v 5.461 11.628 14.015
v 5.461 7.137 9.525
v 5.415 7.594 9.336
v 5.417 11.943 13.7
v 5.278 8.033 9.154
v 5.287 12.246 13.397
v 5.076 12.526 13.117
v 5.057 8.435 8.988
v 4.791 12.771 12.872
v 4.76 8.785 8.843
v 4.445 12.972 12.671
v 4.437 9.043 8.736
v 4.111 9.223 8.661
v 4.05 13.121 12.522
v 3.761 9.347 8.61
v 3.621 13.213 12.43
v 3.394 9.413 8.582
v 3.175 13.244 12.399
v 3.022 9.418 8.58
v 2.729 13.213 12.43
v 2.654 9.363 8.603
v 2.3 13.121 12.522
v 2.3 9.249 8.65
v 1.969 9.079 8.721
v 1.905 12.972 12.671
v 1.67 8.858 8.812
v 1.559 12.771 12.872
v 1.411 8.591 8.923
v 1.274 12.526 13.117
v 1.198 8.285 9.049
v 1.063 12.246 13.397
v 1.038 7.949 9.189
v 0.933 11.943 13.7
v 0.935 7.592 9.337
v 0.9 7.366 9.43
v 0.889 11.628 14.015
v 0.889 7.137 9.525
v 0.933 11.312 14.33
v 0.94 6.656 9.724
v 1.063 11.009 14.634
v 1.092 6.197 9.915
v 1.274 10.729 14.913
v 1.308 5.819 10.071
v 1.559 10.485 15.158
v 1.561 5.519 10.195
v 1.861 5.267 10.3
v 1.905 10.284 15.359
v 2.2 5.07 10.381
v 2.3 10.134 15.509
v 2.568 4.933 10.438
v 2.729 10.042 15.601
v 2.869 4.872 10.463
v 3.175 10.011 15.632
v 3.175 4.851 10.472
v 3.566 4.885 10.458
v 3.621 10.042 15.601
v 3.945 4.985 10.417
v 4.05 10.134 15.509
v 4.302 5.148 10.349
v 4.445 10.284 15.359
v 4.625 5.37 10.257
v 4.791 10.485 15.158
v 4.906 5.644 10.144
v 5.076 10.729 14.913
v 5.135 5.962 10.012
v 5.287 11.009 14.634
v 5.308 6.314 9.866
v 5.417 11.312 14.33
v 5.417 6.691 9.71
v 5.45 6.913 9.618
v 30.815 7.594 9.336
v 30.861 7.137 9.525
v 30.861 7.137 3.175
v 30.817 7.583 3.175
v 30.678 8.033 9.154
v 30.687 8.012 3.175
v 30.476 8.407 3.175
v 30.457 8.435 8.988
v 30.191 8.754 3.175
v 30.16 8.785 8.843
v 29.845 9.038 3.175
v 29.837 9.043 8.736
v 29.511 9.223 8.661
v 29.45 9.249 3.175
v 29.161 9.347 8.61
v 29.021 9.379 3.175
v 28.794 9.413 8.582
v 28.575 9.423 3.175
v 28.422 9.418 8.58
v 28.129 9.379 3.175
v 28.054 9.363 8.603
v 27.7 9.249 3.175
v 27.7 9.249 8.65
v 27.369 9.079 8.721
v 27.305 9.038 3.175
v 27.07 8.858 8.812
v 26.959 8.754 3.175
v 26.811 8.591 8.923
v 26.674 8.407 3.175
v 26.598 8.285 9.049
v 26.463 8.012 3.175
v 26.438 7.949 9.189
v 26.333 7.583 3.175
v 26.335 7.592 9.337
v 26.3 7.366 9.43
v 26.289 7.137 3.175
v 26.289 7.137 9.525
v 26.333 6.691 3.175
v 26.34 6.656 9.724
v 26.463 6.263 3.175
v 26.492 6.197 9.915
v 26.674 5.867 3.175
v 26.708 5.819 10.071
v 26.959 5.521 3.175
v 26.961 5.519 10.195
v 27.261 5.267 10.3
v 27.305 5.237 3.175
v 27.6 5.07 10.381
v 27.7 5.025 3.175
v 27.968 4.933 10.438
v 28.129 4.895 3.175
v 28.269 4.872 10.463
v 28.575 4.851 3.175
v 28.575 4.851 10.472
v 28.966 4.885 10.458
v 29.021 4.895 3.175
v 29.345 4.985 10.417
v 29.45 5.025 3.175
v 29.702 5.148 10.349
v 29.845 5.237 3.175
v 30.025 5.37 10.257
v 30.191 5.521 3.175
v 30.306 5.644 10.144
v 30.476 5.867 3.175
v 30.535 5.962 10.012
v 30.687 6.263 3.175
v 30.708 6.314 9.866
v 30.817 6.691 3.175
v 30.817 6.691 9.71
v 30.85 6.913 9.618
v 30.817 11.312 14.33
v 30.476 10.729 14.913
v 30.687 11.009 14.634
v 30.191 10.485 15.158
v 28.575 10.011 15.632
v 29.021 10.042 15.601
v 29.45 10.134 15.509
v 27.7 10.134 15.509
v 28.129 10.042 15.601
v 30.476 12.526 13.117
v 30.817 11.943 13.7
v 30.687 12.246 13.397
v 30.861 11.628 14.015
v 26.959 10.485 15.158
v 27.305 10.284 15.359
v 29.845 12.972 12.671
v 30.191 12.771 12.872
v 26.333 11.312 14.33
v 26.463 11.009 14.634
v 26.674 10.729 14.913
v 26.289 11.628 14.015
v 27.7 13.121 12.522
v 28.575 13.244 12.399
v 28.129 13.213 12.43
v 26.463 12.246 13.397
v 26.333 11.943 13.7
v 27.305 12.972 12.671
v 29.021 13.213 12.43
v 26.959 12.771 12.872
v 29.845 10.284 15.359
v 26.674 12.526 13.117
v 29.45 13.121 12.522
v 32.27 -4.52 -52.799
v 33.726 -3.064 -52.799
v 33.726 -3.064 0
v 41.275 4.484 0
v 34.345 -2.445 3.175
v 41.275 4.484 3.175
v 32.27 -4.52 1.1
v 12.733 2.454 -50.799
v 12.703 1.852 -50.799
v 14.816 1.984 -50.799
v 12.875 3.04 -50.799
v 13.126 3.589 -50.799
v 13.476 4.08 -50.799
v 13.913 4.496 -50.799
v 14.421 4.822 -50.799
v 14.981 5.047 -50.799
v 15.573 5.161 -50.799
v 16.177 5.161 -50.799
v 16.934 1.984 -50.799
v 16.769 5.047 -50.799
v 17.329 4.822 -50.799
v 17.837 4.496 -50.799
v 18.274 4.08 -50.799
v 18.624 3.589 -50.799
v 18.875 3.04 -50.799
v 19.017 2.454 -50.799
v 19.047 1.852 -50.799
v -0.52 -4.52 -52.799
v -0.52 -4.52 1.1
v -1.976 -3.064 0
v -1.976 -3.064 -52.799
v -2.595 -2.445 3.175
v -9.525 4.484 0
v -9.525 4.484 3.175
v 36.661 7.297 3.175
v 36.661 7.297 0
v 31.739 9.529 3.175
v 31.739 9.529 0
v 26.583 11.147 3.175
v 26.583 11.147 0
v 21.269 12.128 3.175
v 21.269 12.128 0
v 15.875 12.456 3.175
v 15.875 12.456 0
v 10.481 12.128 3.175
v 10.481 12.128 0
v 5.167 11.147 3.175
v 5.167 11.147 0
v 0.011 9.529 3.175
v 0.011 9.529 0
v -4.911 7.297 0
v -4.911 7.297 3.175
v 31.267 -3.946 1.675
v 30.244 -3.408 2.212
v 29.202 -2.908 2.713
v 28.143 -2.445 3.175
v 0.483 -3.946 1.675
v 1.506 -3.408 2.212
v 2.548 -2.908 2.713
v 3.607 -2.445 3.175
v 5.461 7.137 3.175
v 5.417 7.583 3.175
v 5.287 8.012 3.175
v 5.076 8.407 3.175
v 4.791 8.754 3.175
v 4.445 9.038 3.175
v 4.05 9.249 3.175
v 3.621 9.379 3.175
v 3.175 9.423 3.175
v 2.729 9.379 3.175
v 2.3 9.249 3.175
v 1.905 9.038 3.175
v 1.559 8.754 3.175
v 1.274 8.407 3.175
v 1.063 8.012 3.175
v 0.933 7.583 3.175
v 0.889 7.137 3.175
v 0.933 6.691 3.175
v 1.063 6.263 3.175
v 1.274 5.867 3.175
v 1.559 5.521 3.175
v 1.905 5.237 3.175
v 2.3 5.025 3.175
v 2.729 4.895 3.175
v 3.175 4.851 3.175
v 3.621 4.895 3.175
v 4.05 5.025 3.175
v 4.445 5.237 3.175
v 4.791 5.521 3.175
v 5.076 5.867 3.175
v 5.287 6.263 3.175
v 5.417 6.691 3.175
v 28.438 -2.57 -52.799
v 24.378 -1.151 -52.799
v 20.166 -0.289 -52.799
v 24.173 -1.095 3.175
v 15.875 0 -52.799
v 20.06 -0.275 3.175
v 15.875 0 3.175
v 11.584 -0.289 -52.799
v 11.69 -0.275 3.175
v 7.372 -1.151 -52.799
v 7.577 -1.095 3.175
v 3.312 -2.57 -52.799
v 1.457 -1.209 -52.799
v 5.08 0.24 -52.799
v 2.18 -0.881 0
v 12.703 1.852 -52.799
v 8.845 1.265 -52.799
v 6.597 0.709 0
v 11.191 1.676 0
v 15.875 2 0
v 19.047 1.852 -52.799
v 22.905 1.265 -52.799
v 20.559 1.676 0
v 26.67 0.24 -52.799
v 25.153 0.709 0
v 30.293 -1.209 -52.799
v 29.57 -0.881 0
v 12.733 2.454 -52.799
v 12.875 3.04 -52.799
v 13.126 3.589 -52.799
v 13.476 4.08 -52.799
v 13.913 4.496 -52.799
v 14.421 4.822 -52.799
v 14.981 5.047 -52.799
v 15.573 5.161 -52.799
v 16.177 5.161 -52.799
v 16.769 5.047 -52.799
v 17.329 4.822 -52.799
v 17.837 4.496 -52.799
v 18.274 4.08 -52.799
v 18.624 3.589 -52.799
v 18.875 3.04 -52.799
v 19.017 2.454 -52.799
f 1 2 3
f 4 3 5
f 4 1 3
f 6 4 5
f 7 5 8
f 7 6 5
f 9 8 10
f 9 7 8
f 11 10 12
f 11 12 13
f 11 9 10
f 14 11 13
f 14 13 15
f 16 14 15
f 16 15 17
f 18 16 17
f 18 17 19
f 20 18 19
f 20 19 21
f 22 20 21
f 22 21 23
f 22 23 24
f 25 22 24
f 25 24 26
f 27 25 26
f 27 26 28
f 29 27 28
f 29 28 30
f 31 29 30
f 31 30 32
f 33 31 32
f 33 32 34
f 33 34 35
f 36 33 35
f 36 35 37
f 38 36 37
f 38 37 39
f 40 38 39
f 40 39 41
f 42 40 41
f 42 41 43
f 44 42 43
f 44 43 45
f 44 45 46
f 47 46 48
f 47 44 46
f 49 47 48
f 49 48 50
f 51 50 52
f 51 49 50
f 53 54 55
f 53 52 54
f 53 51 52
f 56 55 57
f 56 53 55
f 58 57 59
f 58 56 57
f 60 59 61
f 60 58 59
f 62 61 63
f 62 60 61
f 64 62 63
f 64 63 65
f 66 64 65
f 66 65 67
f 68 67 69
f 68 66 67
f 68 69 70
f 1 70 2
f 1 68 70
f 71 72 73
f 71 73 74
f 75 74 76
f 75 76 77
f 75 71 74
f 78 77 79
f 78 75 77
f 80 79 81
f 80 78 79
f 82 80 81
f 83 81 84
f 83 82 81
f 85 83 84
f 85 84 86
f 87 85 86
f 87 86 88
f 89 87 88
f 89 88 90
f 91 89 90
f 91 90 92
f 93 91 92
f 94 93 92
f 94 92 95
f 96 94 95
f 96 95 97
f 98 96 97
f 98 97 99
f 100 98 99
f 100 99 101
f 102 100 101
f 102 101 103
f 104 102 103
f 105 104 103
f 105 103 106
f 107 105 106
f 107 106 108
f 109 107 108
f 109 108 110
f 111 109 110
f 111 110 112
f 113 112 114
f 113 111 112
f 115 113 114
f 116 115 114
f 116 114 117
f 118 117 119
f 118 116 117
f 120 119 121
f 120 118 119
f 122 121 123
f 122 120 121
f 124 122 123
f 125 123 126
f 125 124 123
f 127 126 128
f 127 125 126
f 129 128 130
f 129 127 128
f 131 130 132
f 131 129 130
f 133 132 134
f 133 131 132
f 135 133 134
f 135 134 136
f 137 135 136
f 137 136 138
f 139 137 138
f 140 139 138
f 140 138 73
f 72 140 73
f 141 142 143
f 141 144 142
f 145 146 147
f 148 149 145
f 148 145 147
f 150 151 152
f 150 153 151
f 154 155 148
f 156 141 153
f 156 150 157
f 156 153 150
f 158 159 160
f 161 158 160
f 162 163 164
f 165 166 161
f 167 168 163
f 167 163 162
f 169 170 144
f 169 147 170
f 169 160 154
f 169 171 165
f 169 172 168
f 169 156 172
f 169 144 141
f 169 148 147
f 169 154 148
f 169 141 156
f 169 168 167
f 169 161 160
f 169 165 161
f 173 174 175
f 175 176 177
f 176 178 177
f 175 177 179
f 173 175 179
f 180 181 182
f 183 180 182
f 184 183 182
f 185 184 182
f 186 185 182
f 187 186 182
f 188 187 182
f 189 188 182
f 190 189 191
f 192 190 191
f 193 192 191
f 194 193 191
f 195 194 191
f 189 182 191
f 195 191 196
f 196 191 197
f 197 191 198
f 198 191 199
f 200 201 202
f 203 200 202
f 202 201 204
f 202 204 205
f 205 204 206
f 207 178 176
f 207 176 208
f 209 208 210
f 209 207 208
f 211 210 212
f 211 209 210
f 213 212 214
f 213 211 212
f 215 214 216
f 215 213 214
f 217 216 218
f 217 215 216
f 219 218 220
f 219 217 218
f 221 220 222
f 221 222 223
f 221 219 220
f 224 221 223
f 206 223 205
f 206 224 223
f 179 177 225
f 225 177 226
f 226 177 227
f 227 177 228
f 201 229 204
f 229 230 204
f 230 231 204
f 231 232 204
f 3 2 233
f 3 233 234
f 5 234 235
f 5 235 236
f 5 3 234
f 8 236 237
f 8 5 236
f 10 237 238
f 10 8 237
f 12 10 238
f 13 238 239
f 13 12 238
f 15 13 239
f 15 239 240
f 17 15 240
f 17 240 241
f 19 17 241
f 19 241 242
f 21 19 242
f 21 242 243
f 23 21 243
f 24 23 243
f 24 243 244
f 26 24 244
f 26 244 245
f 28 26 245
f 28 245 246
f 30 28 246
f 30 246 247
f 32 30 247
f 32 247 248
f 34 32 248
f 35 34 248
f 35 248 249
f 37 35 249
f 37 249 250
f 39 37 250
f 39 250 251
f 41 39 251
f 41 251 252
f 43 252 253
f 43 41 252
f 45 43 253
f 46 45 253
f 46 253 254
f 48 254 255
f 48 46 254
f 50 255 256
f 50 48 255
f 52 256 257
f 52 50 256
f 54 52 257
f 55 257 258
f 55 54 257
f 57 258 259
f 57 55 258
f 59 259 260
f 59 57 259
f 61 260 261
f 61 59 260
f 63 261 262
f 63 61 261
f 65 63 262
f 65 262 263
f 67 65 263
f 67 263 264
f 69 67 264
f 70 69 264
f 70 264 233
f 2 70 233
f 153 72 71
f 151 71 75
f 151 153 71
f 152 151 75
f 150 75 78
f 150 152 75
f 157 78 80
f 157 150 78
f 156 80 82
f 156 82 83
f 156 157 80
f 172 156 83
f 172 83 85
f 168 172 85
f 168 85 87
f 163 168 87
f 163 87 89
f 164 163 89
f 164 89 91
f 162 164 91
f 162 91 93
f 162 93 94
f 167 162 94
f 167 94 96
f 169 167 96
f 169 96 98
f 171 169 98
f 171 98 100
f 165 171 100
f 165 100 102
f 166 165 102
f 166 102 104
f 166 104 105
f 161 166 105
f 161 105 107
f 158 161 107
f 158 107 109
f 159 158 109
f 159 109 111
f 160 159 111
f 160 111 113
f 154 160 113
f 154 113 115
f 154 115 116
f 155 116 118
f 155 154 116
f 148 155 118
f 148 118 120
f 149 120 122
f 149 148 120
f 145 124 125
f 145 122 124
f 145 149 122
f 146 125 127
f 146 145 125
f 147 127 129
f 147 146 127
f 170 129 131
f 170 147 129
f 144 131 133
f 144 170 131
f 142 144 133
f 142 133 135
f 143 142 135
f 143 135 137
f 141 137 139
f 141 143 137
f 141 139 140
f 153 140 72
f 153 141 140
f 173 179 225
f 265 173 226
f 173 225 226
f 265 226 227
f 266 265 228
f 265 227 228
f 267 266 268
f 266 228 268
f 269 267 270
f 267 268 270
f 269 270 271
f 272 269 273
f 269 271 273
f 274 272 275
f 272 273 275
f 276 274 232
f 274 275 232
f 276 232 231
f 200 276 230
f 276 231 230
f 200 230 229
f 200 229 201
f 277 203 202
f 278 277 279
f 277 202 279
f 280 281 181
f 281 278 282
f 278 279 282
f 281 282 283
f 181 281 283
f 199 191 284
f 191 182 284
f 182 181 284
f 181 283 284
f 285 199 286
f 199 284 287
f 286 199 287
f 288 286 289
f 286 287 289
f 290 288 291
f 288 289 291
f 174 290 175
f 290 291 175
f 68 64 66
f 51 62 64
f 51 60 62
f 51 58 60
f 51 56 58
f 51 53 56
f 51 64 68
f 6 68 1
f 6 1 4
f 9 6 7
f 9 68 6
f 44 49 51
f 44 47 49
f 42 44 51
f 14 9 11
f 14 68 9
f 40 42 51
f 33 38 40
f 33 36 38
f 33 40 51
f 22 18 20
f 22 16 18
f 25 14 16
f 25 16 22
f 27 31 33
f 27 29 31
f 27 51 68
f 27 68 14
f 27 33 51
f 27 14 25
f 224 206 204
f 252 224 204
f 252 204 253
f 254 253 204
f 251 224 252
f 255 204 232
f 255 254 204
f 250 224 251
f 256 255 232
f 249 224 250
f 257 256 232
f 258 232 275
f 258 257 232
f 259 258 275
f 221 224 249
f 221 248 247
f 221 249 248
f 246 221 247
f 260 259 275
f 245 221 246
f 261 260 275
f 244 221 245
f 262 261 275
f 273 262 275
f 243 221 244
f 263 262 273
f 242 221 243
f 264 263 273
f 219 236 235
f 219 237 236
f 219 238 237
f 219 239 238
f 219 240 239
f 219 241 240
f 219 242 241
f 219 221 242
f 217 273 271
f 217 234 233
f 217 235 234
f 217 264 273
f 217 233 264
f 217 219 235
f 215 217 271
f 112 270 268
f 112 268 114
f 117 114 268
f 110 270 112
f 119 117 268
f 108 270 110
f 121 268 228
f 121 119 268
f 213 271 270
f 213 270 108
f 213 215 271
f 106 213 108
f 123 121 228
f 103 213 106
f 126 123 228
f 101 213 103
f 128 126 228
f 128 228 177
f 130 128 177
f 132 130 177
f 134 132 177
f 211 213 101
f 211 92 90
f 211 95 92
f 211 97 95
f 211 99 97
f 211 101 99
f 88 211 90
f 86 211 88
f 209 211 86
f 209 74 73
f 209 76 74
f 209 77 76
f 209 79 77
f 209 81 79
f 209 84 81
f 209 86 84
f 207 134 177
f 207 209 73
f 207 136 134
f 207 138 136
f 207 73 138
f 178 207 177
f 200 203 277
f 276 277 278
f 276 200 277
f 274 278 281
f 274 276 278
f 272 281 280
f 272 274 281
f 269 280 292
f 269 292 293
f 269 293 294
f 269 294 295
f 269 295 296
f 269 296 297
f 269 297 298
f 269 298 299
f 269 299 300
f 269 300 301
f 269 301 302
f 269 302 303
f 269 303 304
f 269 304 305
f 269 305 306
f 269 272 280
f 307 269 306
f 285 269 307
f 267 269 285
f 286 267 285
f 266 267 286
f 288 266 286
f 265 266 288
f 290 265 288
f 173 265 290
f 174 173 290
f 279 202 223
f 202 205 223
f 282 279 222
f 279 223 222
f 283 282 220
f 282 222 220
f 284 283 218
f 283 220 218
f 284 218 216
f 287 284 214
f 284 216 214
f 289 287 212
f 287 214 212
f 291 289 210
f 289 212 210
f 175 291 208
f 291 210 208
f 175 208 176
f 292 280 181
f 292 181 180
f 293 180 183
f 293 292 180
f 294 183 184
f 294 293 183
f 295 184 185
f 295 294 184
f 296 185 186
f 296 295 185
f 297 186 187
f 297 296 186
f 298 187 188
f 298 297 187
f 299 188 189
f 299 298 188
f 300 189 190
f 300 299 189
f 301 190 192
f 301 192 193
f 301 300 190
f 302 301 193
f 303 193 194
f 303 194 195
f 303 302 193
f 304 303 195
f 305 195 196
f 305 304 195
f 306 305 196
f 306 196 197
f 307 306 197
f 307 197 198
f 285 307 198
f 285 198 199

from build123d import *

# Parameters (mm, degrees)
F0_W      = 31.75
F0_H      = 9.525
F1_DEPTH  = 3.175
F4_R      = 2.286
F8_R      = 2.286
F11_DEPTH = 3.175
F13_DEPTH = 52.79898
F15_DEPTH = 25.4
F17_DEPTH = 2


with BuildPart() as f1:
    # F0 (on Top) → F1 (new body)
    with BuildSketch(Plane.XY):
        with Locations((15.875, 4.7625)):
            Rectangle(F0_W, F0_H)
    extrude(amount=F1_DEPTH)

    # F5: sweep along a path in F3
    with BuildLine(Plane.YZ.offset(28.575)) as f5_path:
        Line((7.1374, 3.175), (7.1374, 9.525))
        Line((7.1374, 9.525), (11.6275280605, 14.0151280605))
    # F4 (on face) → F5 (sweep)
    with BuildSketch(Plane.XY.offset(3.175)):
        with Locations((28.575, 7.1374)):
            Circle(F4_R)
    sweep(path=f5_path.line, transition=Transition.RIGHT)

    # F9: sweep along a path in F7
    with BuildLine(Plane.YZ.offset(3.175)) as f9_path:
        Line((7.1374, 3.175), (7.1374, 9.525))
        Line((7.1374, 9.525), (11.6275280605, 14.0151280605))
    # F8 (on face) → F9 (sweep)
    with BuildSketch(Plane.XY.offset(3.175)):
        with Locations((3.175, 7.1374)):
            Circle(F8_R)
    sweep(path=f9_path.line, transition=Transition.RIGHT)

    # F10 (on face) → F11 (join, through all)
    with BuildSketch(Plane.XY.offset(3.175)):
        with BuildLine():
            Line((32.2702801376, -4.5202594941), (41.275, 4.4844603683))
            ThreePointArc((41.275, 4.4844603683), (15.875, 12.4564875628), (-9.525, 4.4844603683))
            Line((-9.525, 4.4844603683), (-0.5202801376, -4.5202594941))
            ThreePointArc((-0.5202801376, -4.5202594941), (15.875, 0), (32.2702801376, -4.5202594941))
        make_face()
    extrude(amount=-F11_DEPTH)

    # F12 (on face) → F13 (join)
    with BuildSketch(Plane(origin=(0, 0, 0), x_dir=(1, 0, 0), z_dir=(0, 0, -1))):
        with BuildLine():
            Line((-0.5202801376, 4.5202594941), (-1.9761626677, 3.064376964))
            ThreePointArc((-1.9761626677, 3.064376964), (15.875, -2), (33.7261626677, 3.064376964))
            Line((33.7261626677, 3.064376964), (32.2702801376, 4.5202594941))
            ThreePointArc((32.2702801376, 4.5202594941), (15.875, 0), (-0.5202801376, 4.5202594941))
        make_face()
    extrude(amount=F13_DEPTH)

    # F14 (on face) → F15 (cut)
    with BuildSketch(Plane(origin=(0, 12.8213280605, 12.8213280605), x_dir=(1, 0, 0), z_dir=(0, 0.7071067812, 0.7071067812))):
        Polygon((3.175, -3.9742881508), (-2.5950474281, -3.9742881508), (-2.5950474281, -10.2548293379), (34.3450474281, -10.2548293379), (34.3450474281, -3.9742881508), align=None)
    extrude(amount=-F15_DEPTH, mode=Mode.SUBTRACT)

    # F16 (on face) → F17 (join)
    with BuildSketch(Plane(origin=(0, 0, -52.79898), x_dir=(1, 0, 0), z_dir=(0, 0, -1))):
        with BuildLine():
            ThreePointArc((19.0465359344, -1.8517272227), (15.875, -2), (12.7034640656, -1.8517272227))
            ThreePointArc((12.7034640656, -1.8517272227), (15.875, -5.175), (19.0465359344, -1.8517272227))
        make_face()
    extrude(amount=-F17_DEPTH)


solid = f1.part
